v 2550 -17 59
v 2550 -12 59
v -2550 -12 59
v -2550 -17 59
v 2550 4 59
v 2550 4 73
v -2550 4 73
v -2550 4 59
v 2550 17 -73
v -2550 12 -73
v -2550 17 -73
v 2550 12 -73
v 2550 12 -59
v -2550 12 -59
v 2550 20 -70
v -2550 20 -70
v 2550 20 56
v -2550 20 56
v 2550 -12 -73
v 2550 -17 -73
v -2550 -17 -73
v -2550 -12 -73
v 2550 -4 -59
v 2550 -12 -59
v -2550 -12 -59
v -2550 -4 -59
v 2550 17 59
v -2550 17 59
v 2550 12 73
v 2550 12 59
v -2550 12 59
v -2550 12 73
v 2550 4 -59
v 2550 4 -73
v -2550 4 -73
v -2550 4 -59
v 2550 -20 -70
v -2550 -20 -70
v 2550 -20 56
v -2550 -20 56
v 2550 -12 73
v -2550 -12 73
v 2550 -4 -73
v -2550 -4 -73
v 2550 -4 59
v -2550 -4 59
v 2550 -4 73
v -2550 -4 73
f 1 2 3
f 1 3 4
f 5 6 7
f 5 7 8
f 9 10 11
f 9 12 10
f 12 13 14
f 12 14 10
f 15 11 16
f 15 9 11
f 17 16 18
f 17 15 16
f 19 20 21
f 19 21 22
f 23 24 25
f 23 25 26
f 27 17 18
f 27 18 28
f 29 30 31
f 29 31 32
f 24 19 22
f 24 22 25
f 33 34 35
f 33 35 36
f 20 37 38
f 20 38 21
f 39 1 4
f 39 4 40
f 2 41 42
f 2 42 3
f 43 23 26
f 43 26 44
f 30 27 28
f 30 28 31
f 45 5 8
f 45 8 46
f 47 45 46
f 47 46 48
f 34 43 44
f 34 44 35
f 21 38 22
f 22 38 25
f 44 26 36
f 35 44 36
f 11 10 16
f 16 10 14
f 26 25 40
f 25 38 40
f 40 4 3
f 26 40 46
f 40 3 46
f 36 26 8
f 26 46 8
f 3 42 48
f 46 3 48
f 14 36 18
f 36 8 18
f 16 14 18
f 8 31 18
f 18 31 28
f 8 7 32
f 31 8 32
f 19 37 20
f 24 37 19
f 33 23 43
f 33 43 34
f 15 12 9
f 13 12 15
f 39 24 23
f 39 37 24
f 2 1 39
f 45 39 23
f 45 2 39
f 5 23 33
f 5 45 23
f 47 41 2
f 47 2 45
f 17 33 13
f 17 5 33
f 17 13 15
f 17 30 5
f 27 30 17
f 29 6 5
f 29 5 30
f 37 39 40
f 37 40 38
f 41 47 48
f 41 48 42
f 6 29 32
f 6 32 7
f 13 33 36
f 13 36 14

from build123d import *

# Parameters (mm, degrees)
F1_DEPTH = 2550


with BuildPart() as f1:
    # F0 (on Right) → F1 (new body, symmetric)
    with BuildSketch(Plane.YZ):
        Polygon((20, -70), (20, 56), (17, 59), (12, 59), (12, 73), (4, 73), (4, 59), (-4, 59), (-4, 73), (-12, 73), (-12, 59), (-17, 59), (-20, 56), (-20, -70), (-17, -73), (-12, -73), (-12, -59), (-4, -59), (-4, -73), (4, -73), (4, -59), (12, -59), (12, -73), (17, -73), align=None)
    extrude(amount=F1_DEPTH, both=True)


solid = f1.part
